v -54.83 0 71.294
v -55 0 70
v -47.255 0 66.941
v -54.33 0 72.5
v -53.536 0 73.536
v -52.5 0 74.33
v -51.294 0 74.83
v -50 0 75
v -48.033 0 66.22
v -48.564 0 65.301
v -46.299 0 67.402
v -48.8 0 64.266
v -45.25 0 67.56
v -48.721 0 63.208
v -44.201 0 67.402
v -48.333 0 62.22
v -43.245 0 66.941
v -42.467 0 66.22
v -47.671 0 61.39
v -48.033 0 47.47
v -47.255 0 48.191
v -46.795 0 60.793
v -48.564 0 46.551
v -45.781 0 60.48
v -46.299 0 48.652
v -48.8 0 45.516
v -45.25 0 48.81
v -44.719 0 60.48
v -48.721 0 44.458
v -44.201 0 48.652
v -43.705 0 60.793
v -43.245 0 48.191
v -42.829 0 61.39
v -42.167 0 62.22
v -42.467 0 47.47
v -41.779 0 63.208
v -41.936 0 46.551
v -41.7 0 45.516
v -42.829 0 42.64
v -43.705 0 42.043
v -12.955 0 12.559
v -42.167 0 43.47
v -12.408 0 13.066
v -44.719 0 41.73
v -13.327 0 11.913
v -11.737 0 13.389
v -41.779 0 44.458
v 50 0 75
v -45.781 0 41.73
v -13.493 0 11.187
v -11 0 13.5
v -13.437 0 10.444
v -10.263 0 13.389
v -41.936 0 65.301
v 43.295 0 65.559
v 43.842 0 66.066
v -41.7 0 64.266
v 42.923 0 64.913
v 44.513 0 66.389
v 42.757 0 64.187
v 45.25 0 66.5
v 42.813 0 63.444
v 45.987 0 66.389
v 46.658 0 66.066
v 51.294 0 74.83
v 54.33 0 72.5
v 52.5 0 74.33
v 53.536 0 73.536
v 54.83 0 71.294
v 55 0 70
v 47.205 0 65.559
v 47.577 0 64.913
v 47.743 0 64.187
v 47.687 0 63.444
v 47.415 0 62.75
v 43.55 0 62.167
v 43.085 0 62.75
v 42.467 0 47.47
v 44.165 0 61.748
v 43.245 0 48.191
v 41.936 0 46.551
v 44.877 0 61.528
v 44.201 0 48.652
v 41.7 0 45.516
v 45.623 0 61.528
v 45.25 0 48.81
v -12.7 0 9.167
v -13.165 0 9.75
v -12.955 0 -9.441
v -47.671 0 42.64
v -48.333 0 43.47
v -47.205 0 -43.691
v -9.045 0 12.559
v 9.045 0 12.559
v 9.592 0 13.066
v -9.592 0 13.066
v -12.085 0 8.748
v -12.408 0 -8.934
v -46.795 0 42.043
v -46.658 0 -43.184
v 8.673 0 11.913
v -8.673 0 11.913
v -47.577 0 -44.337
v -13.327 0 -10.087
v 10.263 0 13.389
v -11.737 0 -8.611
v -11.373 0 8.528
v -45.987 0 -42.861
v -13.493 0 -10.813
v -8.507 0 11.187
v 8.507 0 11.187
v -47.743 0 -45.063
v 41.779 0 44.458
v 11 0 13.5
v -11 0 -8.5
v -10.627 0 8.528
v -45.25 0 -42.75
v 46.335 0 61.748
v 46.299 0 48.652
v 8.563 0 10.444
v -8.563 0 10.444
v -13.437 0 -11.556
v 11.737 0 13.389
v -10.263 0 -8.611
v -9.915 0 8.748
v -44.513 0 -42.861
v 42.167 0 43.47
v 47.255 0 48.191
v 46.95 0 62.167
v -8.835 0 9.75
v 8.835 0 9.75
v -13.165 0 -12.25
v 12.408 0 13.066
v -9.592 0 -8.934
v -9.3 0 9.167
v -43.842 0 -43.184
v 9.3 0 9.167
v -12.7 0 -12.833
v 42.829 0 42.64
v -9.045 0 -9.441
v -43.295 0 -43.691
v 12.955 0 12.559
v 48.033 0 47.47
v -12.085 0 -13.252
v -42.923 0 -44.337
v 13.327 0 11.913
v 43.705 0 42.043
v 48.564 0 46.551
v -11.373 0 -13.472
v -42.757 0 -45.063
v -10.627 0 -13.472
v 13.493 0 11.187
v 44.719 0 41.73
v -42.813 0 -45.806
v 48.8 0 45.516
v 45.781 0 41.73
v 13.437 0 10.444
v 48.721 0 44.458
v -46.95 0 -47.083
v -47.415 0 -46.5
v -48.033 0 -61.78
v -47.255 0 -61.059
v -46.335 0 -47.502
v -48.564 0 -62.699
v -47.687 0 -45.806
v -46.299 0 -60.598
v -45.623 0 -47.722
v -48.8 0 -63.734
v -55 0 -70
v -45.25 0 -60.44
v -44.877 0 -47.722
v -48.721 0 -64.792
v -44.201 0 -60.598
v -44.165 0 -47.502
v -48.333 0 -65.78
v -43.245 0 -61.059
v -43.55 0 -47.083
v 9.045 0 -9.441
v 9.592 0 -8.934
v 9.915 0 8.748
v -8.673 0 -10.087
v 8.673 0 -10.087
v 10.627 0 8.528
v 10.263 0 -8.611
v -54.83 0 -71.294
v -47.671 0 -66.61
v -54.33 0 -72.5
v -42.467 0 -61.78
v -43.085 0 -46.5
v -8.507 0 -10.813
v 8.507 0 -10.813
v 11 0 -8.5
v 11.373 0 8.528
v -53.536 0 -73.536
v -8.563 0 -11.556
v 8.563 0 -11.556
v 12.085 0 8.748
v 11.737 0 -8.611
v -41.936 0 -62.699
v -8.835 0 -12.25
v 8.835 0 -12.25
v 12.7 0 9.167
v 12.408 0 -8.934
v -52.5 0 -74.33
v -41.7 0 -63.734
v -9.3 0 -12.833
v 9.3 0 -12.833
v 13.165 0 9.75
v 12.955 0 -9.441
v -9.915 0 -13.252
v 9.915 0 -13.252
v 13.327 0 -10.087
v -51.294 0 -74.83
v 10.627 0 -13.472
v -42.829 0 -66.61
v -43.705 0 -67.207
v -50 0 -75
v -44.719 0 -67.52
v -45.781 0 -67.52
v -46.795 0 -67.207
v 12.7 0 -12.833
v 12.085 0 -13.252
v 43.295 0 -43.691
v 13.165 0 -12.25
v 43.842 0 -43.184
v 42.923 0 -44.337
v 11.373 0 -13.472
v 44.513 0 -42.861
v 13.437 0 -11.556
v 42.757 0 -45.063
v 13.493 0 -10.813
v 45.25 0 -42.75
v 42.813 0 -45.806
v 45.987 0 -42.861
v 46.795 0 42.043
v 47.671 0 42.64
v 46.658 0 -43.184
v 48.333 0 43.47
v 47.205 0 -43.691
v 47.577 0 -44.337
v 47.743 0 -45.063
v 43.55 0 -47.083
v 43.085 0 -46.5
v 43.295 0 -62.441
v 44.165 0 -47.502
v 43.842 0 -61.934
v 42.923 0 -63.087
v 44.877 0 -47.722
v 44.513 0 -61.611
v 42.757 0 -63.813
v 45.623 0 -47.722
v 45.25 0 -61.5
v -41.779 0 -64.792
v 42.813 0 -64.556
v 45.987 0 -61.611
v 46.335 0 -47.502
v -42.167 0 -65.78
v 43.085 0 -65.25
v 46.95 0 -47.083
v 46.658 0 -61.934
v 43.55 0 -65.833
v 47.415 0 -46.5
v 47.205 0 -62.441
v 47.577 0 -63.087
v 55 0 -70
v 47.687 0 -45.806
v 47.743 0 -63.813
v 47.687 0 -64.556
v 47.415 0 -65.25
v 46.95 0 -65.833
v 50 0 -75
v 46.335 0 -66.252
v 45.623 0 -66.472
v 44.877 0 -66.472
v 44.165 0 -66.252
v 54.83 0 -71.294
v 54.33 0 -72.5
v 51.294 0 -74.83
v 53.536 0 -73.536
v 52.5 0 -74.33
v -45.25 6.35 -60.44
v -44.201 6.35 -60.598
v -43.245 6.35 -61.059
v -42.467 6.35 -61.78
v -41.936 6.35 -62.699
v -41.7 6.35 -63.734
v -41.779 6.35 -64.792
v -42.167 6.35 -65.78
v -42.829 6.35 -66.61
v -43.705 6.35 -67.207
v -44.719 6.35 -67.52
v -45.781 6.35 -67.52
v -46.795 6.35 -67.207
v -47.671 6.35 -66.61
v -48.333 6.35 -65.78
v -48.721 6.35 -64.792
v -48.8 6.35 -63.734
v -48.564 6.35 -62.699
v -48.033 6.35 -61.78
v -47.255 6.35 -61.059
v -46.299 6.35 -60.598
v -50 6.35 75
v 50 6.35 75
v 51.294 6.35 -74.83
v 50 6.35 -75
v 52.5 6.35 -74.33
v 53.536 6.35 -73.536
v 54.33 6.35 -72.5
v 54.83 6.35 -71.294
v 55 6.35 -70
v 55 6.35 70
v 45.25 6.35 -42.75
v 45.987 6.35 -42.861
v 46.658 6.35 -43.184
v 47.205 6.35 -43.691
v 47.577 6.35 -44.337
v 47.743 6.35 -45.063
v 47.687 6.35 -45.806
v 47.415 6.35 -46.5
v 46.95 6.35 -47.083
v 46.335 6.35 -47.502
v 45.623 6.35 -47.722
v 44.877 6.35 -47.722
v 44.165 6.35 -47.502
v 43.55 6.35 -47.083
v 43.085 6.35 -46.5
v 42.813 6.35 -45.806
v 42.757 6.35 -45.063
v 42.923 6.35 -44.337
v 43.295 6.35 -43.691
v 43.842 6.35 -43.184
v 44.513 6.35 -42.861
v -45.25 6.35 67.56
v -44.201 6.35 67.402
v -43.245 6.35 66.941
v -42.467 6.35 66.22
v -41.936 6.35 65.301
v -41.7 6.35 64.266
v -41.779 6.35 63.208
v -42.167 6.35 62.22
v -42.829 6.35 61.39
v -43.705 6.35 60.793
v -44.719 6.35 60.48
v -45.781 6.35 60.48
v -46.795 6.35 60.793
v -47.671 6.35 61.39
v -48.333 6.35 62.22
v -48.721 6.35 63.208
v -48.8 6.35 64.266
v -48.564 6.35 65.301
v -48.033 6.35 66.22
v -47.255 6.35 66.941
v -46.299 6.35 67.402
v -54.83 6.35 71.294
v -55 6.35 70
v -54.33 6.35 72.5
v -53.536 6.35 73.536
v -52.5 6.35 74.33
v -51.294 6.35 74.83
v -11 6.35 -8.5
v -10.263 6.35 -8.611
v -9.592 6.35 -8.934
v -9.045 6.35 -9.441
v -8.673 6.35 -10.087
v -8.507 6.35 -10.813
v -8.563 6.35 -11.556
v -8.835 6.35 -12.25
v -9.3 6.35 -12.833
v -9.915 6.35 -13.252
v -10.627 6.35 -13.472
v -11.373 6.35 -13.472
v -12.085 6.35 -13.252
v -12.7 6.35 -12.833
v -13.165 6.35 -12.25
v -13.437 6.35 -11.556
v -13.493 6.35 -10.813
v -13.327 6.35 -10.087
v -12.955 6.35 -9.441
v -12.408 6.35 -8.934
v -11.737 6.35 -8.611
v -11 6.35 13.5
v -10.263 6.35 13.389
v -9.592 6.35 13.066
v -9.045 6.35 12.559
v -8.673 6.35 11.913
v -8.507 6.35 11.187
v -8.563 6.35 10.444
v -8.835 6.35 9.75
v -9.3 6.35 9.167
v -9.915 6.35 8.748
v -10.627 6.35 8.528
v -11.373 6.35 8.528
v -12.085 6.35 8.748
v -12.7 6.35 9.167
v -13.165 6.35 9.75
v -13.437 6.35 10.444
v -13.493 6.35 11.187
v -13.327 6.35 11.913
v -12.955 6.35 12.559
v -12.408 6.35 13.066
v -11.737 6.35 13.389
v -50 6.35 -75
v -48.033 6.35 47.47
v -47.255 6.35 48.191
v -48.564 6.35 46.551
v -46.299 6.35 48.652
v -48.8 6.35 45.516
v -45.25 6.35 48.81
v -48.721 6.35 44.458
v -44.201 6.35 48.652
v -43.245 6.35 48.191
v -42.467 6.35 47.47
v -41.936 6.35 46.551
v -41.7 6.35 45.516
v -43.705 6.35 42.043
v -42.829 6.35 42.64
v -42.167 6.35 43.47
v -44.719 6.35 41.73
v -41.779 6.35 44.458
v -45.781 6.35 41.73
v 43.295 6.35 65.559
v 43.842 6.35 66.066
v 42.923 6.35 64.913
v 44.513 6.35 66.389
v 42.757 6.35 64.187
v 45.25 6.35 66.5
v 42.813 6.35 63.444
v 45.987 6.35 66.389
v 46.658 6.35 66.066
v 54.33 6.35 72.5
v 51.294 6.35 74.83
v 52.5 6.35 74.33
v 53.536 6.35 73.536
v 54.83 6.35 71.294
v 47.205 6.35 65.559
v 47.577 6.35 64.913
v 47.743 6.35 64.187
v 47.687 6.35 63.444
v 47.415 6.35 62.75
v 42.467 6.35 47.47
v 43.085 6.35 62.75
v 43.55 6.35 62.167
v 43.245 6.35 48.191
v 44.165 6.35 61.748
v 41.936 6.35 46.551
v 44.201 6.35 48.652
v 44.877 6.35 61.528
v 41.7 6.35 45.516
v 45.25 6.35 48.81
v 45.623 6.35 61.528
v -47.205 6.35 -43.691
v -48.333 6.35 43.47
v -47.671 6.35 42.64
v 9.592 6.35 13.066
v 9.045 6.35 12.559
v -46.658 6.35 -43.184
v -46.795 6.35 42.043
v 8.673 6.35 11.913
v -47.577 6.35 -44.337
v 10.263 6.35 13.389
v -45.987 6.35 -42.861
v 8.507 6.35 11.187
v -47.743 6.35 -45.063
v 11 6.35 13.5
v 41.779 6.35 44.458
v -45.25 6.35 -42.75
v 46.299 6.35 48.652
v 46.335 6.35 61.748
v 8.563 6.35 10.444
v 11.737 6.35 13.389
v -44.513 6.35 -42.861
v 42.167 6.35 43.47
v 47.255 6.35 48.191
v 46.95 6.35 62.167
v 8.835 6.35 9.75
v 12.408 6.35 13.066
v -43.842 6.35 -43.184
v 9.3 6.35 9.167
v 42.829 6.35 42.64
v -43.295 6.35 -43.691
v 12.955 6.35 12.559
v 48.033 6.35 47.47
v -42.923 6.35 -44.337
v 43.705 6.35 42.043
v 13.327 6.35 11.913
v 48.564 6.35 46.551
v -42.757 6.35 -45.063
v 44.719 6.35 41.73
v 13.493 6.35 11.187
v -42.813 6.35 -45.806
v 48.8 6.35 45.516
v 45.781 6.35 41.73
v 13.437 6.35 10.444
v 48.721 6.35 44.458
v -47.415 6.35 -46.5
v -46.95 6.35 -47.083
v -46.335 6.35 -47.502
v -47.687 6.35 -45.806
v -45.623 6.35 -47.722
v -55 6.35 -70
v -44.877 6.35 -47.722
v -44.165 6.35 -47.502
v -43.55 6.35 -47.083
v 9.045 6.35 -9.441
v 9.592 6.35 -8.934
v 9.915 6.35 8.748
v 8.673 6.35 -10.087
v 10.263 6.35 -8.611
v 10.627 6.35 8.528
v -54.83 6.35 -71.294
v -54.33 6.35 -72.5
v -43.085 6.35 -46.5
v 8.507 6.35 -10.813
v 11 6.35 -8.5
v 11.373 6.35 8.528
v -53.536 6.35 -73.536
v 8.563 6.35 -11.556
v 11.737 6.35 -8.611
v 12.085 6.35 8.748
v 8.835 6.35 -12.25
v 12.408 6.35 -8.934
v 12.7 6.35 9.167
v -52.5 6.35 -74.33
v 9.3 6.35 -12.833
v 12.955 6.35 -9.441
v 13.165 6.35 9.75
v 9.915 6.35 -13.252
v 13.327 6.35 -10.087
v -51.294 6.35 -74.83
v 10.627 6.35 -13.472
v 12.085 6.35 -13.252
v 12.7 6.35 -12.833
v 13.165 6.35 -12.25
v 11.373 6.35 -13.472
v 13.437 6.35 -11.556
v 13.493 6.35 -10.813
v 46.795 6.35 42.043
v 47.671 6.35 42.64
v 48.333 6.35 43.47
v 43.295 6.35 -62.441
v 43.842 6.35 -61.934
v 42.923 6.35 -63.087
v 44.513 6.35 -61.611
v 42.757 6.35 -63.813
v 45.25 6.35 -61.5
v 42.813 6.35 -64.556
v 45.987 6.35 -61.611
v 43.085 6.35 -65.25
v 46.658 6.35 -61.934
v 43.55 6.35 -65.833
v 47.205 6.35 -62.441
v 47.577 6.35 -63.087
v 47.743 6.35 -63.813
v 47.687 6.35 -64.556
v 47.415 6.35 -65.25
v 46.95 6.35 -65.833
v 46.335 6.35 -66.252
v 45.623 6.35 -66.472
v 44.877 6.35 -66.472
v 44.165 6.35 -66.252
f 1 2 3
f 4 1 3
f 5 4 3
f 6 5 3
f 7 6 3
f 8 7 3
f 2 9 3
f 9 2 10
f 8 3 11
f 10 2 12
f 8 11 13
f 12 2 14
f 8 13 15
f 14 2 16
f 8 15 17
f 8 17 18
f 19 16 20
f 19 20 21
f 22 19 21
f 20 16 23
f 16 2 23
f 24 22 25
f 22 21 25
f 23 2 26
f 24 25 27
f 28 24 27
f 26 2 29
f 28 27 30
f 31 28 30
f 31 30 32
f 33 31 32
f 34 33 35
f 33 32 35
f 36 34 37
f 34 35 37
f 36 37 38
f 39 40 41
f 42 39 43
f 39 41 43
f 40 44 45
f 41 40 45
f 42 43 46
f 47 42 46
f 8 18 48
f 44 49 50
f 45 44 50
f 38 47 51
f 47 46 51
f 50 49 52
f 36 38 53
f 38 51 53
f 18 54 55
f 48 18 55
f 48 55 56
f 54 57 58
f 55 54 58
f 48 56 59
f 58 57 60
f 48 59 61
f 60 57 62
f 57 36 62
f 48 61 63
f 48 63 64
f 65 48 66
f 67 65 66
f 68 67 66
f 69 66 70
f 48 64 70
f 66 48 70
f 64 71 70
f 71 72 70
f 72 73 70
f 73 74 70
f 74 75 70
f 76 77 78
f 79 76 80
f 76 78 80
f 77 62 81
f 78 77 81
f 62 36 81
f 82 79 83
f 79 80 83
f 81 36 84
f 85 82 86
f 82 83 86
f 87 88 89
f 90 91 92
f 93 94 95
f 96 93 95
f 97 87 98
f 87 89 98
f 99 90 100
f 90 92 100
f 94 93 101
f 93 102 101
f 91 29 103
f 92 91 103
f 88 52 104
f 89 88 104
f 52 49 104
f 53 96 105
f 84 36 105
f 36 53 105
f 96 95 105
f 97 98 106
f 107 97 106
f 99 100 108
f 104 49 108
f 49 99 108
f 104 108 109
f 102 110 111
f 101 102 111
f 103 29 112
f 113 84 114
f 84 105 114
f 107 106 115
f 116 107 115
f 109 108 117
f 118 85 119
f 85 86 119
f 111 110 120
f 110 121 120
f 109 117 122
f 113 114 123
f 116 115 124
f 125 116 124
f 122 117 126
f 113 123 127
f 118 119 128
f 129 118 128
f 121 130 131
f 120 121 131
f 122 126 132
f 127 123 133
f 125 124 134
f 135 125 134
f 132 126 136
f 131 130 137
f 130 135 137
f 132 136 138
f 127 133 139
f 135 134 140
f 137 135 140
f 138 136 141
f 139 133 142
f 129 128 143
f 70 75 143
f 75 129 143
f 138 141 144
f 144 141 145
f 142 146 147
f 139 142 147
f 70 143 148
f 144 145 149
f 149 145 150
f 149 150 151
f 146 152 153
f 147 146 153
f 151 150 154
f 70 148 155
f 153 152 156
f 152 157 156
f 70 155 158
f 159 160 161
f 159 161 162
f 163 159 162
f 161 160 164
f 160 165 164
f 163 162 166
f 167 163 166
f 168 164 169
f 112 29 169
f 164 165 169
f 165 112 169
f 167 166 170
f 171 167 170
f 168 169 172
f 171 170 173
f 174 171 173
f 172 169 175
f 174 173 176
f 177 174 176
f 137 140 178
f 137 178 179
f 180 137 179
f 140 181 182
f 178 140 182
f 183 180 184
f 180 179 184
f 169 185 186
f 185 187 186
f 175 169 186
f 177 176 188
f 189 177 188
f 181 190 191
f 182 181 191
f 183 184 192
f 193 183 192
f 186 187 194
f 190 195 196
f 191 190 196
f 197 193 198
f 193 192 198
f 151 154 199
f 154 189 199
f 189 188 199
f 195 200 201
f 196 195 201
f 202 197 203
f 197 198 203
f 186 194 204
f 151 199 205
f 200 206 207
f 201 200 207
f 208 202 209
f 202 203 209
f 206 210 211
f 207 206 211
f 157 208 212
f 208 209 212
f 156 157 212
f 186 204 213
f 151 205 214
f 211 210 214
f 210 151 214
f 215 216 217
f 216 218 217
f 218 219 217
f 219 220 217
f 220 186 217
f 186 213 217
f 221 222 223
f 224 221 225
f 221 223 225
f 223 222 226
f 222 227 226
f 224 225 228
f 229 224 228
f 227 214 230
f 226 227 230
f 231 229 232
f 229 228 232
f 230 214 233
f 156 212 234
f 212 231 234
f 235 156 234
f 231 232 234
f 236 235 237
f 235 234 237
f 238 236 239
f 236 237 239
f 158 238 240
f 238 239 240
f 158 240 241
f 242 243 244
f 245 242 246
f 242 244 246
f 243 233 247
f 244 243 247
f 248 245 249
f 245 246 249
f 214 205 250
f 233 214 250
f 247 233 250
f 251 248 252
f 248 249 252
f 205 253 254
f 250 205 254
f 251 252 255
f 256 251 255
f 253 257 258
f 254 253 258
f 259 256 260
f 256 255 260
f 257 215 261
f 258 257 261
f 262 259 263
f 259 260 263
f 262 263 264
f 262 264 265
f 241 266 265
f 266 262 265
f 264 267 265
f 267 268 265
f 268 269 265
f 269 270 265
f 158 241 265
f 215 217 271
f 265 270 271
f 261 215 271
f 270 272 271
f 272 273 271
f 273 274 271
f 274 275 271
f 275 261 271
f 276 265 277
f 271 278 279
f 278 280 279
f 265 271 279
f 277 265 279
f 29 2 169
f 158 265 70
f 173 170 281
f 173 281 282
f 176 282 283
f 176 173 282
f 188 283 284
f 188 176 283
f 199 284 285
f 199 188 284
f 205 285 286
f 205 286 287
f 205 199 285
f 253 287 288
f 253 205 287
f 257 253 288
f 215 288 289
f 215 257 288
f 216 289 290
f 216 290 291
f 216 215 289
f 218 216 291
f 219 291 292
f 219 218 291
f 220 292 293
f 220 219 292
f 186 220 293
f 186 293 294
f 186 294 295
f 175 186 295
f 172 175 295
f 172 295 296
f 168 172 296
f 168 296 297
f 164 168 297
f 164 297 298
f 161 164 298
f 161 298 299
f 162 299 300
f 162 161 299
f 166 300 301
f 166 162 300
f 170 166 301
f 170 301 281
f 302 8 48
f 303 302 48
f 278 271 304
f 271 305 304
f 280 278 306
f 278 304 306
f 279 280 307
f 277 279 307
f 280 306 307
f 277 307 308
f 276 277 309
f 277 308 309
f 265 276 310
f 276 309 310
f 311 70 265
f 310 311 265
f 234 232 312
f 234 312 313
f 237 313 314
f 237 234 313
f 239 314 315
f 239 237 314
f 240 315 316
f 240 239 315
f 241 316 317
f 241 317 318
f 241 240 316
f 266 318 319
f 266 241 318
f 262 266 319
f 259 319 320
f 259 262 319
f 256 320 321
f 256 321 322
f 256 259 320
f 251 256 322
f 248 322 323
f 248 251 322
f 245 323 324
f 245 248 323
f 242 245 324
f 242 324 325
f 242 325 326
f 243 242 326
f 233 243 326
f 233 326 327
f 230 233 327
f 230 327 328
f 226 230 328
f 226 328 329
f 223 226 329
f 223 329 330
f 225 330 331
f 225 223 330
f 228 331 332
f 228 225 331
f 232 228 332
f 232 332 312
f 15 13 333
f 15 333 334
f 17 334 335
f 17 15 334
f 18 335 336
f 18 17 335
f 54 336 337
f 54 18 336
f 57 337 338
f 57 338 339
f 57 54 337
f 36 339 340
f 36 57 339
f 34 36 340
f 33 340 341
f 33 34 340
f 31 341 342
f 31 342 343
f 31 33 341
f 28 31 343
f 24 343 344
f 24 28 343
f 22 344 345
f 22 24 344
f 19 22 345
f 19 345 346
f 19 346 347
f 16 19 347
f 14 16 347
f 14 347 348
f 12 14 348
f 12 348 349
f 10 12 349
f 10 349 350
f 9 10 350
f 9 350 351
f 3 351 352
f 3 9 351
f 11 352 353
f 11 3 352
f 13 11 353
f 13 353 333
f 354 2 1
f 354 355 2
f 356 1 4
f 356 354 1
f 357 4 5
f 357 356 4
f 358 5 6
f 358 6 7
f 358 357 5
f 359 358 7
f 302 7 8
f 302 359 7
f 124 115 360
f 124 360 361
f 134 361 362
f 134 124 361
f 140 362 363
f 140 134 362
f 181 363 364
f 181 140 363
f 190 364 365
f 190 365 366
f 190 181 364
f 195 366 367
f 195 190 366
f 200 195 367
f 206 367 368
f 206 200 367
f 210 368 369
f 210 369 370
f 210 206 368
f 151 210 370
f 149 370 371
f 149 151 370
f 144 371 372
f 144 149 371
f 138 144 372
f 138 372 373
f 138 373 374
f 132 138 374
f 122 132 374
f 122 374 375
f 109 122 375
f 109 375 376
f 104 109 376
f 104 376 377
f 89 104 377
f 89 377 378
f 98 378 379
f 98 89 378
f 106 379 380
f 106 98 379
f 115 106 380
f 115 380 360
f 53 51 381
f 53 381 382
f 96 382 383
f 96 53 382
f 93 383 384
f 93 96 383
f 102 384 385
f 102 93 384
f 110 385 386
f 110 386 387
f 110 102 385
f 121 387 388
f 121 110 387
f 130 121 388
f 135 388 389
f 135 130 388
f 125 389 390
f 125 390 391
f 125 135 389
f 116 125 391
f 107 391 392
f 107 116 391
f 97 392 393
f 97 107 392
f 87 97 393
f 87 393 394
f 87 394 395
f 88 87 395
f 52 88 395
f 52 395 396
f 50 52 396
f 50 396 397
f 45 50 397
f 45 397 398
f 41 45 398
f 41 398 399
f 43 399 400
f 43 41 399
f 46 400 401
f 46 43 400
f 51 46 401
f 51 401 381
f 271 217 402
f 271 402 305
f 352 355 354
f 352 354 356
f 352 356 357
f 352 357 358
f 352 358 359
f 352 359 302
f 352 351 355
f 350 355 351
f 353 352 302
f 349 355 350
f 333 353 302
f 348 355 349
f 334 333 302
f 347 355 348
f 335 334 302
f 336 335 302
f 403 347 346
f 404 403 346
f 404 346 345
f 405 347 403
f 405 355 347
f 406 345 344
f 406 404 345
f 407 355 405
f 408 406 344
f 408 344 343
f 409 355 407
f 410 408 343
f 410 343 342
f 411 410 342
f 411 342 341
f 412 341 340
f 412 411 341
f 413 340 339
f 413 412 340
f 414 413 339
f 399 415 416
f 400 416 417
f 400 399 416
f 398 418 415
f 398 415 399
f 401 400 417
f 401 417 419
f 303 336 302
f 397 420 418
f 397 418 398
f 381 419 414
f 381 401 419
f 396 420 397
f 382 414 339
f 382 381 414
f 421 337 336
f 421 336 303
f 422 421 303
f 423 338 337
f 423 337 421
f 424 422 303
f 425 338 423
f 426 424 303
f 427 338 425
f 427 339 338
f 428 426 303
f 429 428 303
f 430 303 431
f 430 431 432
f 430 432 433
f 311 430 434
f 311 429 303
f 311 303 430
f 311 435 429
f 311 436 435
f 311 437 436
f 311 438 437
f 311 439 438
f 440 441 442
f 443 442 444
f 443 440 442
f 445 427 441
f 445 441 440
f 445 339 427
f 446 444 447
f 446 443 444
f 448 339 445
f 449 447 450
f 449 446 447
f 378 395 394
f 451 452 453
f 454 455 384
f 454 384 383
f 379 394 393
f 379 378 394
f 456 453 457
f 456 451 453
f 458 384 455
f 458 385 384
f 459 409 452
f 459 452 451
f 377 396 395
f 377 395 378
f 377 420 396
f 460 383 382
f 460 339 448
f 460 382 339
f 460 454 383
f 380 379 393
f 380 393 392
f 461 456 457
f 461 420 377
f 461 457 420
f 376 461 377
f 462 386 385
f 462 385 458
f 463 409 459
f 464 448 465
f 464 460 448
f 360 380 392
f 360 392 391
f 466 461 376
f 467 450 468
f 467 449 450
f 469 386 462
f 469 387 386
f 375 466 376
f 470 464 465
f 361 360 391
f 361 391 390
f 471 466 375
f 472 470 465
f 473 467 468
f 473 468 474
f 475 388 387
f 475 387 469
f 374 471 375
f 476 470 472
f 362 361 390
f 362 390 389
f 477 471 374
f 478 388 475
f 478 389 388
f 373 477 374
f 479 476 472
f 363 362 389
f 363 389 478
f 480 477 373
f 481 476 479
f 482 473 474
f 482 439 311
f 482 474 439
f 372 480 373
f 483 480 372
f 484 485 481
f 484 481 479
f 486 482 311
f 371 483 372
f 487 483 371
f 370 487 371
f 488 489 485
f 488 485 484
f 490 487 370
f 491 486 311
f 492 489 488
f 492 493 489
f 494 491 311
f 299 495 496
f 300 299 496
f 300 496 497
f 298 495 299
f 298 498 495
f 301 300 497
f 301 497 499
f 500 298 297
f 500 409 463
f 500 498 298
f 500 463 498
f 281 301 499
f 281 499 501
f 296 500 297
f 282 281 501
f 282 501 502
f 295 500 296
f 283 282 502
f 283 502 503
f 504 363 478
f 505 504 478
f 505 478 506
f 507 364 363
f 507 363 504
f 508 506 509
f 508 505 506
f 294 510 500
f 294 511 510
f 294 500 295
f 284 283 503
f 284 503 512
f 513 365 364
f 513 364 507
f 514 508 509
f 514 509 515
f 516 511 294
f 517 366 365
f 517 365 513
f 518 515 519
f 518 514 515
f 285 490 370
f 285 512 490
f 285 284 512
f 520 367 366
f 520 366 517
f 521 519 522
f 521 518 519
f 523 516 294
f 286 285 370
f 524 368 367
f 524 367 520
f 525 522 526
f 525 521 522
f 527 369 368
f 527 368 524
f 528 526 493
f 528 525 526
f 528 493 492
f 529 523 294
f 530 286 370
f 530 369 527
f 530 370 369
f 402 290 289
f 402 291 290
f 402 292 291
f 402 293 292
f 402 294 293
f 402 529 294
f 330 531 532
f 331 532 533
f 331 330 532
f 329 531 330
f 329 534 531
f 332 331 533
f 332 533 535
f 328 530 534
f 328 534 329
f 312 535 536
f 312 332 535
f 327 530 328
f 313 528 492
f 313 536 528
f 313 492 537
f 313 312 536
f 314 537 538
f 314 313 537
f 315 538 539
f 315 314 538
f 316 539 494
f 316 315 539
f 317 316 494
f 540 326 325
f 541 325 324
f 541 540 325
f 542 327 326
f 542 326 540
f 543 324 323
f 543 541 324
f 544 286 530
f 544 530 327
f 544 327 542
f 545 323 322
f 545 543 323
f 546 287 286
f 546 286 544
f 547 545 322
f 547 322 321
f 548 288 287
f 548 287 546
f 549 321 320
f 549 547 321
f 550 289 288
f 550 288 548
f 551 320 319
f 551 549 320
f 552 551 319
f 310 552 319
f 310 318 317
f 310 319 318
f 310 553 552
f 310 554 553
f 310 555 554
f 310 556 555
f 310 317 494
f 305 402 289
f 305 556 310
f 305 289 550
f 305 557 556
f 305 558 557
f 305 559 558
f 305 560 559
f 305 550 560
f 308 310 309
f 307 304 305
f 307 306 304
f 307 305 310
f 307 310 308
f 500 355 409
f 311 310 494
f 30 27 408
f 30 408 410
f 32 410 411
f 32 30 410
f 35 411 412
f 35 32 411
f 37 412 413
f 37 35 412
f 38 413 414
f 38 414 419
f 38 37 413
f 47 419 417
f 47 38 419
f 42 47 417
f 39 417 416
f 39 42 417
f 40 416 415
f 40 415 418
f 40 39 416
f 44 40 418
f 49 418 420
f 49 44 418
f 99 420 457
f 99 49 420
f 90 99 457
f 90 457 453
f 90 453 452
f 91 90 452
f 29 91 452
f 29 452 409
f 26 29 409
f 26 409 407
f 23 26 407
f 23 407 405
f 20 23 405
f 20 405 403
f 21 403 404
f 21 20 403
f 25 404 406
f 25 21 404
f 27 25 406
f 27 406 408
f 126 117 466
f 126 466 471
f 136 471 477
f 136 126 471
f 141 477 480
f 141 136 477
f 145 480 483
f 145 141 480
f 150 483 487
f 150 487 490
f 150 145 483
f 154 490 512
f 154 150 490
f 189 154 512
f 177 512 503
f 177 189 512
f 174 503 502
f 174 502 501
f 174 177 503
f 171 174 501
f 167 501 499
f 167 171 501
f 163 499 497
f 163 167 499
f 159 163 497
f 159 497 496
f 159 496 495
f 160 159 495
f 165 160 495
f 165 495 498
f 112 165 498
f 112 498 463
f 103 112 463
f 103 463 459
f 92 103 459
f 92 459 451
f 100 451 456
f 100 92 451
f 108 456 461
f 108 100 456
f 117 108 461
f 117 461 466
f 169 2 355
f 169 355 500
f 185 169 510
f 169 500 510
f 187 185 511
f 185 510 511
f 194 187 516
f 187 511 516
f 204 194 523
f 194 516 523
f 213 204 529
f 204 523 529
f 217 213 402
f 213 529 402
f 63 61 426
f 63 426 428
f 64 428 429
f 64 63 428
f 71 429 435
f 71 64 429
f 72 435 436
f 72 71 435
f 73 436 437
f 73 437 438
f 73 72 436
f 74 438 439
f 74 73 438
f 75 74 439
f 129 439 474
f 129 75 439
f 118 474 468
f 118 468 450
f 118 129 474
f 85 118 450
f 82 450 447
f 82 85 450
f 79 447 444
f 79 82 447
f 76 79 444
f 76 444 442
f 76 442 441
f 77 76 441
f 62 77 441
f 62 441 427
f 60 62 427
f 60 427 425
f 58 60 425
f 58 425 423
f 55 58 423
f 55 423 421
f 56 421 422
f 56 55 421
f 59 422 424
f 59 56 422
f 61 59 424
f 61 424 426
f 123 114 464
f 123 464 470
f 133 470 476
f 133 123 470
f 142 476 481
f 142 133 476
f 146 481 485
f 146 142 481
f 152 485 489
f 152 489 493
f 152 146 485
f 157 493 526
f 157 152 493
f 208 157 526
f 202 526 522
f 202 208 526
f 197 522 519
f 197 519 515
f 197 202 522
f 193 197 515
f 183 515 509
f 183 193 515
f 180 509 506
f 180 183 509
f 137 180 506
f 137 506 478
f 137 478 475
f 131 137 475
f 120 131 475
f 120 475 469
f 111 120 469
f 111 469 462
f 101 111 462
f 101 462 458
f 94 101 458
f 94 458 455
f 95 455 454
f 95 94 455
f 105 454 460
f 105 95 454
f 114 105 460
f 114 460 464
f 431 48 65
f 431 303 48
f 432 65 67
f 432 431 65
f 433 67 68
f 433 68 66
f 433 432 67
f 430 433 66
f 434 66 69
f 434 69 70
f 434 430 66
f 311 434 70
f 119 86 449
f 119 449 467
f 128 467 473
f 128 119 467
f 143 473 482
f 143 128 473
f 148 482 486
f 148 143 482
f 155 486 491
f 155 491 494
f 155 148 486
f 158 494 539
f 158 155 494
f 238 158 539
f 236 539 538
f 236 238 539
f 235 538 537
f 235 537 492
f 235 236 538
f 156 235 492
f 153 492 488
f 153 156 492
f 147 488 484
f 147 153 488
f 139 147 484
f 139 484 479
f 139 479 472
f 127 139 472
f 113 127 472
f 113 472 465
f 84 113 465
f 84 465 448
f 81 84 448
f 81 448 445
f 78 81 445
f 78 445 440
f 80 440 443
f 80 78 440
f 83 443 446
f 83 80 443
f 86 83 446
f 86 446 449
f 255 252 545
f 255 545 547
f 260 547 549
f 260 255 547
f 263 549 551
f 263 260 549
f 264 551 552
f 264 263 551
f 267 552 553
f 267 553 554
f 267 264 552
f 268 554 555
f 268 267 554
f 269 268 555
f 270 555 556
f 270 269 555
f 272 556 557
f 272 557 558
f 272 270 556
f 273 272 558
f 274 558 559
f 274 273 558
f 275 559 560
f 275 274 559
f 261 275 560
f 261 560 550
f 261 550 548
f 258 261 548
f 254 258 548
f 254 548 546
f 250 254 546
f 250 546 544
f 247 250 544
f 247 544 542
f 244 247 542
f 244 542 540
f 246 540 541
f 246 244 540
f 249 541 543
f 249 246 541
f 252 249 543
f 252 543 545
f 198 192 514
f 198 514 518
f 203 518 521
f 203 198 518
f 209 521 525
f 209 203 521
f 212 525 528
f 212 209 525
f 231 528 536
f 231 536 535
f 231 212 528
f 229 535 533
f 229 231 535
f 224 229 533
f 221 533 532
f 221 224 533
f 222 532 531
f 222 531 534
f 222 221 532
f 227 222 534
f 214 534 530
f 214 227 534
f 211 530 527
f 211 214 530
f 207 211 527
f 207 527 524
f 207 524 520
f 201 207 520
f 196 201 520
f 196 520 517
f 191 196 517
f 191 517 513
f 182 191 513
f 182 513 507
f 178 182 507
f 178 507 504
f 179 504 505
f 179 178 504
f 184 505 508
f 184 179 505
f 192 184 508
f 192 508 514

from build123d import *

# Parameters (mm, degrees)
SKETCH2_W           = 110
SKETCH2_H           = 150
SKETCH2_R           = 3.56
SKETCH2_R_2         = 2.5
BOSS_EXTRUDE1_DEPTH = 6.35
FILLET1_R           = 5


with BuildPart() as part:
    # Sketch2 → Boss-Extrude1 (new body)
    with BuildSketch(Plane(origin=(0, 0, 0), x_dir=(1, 0, 0), z_dir=(0, 1, 0))):
        Rectangle(SKETCH2_W, SKETCH2_H)
        with Locations(Location((-45.25, 64, 0), (0, 0, 270))):
            Circle(SKETCH2_R, mode=Mode.SUBTRACT)
        with Locations(Location((-45.25, -64, 0), (0, 0, 270))):
            Circle(SKETCH2_R, mode=Mode.SUBTRACT)
        with Locations(Location((45.25, 64, 0), (0, 0, 270))):
            Circle(SKETCH2_R_2, mode=Mode.SUBTRACT)
        with Locations(Location((45.25, -64, 0), (0, 0, 270))):
            Circle(SKETCH2_R_2, mode=Mode.SUBTRACT)
        with Locations(Location((-45.25, -45.25, 0), (0, 0, 270))):
            Circle(SKETCH2_R, mode=Mode.SUBTRACT)
        with Locations(Location((45.25, -45.25, 0), (0, 0, 270))):
            Circle(SKETCH2_R, mode=Mode.SUBTRACT)
        with Locations(Location((-45.25, 45.25, 0), (0, 0, 270))):
            Circle(SKETCH2_R_2, mode=Mode.SUBTRACT)
        with Locations(Location((45.25, 45.25, 0), (0, 0, 270))):
            Circle(SKETCH2_R_2, mode=Mode.SUBTRACT)
        with Locations(Location((-11, 11, 0), (0, 0, 270))):
            Circle(SKETCH2_R_2, mode=Mode.SUBTRACT)
        with Locations(Location((11, 11, 0), (0, 0, 270))):
            Circle(SKETCH2_R_2, mode=Mode.SUBTRACT)
        with Locations(Location((11, -11, 0), (0, 0, 270))):
            Circle(SKETCH2_R_2, mode=Mode.SUBTRACT)
        with Locations(Location((-11, -11, 0), (0, 0, 270))):
            Circle(SKETCH2_R_2, mode=Mode.SUBTRACT)
    extrude(amount=BOSS_EXTRUDE1_DEPTH)

    # Fillet1
    fillet1_edges = [part.edges().sort_by_distance(p)[0] for p in [
        (-55, 3.175, -75),
        (55, 3.175, -75),
        (55, 3.175, 75),
        (-55, 3.175, 75),
    ]]
    fillet(fillet1_edges, radius=FILLET1_R)


solid = part.part
